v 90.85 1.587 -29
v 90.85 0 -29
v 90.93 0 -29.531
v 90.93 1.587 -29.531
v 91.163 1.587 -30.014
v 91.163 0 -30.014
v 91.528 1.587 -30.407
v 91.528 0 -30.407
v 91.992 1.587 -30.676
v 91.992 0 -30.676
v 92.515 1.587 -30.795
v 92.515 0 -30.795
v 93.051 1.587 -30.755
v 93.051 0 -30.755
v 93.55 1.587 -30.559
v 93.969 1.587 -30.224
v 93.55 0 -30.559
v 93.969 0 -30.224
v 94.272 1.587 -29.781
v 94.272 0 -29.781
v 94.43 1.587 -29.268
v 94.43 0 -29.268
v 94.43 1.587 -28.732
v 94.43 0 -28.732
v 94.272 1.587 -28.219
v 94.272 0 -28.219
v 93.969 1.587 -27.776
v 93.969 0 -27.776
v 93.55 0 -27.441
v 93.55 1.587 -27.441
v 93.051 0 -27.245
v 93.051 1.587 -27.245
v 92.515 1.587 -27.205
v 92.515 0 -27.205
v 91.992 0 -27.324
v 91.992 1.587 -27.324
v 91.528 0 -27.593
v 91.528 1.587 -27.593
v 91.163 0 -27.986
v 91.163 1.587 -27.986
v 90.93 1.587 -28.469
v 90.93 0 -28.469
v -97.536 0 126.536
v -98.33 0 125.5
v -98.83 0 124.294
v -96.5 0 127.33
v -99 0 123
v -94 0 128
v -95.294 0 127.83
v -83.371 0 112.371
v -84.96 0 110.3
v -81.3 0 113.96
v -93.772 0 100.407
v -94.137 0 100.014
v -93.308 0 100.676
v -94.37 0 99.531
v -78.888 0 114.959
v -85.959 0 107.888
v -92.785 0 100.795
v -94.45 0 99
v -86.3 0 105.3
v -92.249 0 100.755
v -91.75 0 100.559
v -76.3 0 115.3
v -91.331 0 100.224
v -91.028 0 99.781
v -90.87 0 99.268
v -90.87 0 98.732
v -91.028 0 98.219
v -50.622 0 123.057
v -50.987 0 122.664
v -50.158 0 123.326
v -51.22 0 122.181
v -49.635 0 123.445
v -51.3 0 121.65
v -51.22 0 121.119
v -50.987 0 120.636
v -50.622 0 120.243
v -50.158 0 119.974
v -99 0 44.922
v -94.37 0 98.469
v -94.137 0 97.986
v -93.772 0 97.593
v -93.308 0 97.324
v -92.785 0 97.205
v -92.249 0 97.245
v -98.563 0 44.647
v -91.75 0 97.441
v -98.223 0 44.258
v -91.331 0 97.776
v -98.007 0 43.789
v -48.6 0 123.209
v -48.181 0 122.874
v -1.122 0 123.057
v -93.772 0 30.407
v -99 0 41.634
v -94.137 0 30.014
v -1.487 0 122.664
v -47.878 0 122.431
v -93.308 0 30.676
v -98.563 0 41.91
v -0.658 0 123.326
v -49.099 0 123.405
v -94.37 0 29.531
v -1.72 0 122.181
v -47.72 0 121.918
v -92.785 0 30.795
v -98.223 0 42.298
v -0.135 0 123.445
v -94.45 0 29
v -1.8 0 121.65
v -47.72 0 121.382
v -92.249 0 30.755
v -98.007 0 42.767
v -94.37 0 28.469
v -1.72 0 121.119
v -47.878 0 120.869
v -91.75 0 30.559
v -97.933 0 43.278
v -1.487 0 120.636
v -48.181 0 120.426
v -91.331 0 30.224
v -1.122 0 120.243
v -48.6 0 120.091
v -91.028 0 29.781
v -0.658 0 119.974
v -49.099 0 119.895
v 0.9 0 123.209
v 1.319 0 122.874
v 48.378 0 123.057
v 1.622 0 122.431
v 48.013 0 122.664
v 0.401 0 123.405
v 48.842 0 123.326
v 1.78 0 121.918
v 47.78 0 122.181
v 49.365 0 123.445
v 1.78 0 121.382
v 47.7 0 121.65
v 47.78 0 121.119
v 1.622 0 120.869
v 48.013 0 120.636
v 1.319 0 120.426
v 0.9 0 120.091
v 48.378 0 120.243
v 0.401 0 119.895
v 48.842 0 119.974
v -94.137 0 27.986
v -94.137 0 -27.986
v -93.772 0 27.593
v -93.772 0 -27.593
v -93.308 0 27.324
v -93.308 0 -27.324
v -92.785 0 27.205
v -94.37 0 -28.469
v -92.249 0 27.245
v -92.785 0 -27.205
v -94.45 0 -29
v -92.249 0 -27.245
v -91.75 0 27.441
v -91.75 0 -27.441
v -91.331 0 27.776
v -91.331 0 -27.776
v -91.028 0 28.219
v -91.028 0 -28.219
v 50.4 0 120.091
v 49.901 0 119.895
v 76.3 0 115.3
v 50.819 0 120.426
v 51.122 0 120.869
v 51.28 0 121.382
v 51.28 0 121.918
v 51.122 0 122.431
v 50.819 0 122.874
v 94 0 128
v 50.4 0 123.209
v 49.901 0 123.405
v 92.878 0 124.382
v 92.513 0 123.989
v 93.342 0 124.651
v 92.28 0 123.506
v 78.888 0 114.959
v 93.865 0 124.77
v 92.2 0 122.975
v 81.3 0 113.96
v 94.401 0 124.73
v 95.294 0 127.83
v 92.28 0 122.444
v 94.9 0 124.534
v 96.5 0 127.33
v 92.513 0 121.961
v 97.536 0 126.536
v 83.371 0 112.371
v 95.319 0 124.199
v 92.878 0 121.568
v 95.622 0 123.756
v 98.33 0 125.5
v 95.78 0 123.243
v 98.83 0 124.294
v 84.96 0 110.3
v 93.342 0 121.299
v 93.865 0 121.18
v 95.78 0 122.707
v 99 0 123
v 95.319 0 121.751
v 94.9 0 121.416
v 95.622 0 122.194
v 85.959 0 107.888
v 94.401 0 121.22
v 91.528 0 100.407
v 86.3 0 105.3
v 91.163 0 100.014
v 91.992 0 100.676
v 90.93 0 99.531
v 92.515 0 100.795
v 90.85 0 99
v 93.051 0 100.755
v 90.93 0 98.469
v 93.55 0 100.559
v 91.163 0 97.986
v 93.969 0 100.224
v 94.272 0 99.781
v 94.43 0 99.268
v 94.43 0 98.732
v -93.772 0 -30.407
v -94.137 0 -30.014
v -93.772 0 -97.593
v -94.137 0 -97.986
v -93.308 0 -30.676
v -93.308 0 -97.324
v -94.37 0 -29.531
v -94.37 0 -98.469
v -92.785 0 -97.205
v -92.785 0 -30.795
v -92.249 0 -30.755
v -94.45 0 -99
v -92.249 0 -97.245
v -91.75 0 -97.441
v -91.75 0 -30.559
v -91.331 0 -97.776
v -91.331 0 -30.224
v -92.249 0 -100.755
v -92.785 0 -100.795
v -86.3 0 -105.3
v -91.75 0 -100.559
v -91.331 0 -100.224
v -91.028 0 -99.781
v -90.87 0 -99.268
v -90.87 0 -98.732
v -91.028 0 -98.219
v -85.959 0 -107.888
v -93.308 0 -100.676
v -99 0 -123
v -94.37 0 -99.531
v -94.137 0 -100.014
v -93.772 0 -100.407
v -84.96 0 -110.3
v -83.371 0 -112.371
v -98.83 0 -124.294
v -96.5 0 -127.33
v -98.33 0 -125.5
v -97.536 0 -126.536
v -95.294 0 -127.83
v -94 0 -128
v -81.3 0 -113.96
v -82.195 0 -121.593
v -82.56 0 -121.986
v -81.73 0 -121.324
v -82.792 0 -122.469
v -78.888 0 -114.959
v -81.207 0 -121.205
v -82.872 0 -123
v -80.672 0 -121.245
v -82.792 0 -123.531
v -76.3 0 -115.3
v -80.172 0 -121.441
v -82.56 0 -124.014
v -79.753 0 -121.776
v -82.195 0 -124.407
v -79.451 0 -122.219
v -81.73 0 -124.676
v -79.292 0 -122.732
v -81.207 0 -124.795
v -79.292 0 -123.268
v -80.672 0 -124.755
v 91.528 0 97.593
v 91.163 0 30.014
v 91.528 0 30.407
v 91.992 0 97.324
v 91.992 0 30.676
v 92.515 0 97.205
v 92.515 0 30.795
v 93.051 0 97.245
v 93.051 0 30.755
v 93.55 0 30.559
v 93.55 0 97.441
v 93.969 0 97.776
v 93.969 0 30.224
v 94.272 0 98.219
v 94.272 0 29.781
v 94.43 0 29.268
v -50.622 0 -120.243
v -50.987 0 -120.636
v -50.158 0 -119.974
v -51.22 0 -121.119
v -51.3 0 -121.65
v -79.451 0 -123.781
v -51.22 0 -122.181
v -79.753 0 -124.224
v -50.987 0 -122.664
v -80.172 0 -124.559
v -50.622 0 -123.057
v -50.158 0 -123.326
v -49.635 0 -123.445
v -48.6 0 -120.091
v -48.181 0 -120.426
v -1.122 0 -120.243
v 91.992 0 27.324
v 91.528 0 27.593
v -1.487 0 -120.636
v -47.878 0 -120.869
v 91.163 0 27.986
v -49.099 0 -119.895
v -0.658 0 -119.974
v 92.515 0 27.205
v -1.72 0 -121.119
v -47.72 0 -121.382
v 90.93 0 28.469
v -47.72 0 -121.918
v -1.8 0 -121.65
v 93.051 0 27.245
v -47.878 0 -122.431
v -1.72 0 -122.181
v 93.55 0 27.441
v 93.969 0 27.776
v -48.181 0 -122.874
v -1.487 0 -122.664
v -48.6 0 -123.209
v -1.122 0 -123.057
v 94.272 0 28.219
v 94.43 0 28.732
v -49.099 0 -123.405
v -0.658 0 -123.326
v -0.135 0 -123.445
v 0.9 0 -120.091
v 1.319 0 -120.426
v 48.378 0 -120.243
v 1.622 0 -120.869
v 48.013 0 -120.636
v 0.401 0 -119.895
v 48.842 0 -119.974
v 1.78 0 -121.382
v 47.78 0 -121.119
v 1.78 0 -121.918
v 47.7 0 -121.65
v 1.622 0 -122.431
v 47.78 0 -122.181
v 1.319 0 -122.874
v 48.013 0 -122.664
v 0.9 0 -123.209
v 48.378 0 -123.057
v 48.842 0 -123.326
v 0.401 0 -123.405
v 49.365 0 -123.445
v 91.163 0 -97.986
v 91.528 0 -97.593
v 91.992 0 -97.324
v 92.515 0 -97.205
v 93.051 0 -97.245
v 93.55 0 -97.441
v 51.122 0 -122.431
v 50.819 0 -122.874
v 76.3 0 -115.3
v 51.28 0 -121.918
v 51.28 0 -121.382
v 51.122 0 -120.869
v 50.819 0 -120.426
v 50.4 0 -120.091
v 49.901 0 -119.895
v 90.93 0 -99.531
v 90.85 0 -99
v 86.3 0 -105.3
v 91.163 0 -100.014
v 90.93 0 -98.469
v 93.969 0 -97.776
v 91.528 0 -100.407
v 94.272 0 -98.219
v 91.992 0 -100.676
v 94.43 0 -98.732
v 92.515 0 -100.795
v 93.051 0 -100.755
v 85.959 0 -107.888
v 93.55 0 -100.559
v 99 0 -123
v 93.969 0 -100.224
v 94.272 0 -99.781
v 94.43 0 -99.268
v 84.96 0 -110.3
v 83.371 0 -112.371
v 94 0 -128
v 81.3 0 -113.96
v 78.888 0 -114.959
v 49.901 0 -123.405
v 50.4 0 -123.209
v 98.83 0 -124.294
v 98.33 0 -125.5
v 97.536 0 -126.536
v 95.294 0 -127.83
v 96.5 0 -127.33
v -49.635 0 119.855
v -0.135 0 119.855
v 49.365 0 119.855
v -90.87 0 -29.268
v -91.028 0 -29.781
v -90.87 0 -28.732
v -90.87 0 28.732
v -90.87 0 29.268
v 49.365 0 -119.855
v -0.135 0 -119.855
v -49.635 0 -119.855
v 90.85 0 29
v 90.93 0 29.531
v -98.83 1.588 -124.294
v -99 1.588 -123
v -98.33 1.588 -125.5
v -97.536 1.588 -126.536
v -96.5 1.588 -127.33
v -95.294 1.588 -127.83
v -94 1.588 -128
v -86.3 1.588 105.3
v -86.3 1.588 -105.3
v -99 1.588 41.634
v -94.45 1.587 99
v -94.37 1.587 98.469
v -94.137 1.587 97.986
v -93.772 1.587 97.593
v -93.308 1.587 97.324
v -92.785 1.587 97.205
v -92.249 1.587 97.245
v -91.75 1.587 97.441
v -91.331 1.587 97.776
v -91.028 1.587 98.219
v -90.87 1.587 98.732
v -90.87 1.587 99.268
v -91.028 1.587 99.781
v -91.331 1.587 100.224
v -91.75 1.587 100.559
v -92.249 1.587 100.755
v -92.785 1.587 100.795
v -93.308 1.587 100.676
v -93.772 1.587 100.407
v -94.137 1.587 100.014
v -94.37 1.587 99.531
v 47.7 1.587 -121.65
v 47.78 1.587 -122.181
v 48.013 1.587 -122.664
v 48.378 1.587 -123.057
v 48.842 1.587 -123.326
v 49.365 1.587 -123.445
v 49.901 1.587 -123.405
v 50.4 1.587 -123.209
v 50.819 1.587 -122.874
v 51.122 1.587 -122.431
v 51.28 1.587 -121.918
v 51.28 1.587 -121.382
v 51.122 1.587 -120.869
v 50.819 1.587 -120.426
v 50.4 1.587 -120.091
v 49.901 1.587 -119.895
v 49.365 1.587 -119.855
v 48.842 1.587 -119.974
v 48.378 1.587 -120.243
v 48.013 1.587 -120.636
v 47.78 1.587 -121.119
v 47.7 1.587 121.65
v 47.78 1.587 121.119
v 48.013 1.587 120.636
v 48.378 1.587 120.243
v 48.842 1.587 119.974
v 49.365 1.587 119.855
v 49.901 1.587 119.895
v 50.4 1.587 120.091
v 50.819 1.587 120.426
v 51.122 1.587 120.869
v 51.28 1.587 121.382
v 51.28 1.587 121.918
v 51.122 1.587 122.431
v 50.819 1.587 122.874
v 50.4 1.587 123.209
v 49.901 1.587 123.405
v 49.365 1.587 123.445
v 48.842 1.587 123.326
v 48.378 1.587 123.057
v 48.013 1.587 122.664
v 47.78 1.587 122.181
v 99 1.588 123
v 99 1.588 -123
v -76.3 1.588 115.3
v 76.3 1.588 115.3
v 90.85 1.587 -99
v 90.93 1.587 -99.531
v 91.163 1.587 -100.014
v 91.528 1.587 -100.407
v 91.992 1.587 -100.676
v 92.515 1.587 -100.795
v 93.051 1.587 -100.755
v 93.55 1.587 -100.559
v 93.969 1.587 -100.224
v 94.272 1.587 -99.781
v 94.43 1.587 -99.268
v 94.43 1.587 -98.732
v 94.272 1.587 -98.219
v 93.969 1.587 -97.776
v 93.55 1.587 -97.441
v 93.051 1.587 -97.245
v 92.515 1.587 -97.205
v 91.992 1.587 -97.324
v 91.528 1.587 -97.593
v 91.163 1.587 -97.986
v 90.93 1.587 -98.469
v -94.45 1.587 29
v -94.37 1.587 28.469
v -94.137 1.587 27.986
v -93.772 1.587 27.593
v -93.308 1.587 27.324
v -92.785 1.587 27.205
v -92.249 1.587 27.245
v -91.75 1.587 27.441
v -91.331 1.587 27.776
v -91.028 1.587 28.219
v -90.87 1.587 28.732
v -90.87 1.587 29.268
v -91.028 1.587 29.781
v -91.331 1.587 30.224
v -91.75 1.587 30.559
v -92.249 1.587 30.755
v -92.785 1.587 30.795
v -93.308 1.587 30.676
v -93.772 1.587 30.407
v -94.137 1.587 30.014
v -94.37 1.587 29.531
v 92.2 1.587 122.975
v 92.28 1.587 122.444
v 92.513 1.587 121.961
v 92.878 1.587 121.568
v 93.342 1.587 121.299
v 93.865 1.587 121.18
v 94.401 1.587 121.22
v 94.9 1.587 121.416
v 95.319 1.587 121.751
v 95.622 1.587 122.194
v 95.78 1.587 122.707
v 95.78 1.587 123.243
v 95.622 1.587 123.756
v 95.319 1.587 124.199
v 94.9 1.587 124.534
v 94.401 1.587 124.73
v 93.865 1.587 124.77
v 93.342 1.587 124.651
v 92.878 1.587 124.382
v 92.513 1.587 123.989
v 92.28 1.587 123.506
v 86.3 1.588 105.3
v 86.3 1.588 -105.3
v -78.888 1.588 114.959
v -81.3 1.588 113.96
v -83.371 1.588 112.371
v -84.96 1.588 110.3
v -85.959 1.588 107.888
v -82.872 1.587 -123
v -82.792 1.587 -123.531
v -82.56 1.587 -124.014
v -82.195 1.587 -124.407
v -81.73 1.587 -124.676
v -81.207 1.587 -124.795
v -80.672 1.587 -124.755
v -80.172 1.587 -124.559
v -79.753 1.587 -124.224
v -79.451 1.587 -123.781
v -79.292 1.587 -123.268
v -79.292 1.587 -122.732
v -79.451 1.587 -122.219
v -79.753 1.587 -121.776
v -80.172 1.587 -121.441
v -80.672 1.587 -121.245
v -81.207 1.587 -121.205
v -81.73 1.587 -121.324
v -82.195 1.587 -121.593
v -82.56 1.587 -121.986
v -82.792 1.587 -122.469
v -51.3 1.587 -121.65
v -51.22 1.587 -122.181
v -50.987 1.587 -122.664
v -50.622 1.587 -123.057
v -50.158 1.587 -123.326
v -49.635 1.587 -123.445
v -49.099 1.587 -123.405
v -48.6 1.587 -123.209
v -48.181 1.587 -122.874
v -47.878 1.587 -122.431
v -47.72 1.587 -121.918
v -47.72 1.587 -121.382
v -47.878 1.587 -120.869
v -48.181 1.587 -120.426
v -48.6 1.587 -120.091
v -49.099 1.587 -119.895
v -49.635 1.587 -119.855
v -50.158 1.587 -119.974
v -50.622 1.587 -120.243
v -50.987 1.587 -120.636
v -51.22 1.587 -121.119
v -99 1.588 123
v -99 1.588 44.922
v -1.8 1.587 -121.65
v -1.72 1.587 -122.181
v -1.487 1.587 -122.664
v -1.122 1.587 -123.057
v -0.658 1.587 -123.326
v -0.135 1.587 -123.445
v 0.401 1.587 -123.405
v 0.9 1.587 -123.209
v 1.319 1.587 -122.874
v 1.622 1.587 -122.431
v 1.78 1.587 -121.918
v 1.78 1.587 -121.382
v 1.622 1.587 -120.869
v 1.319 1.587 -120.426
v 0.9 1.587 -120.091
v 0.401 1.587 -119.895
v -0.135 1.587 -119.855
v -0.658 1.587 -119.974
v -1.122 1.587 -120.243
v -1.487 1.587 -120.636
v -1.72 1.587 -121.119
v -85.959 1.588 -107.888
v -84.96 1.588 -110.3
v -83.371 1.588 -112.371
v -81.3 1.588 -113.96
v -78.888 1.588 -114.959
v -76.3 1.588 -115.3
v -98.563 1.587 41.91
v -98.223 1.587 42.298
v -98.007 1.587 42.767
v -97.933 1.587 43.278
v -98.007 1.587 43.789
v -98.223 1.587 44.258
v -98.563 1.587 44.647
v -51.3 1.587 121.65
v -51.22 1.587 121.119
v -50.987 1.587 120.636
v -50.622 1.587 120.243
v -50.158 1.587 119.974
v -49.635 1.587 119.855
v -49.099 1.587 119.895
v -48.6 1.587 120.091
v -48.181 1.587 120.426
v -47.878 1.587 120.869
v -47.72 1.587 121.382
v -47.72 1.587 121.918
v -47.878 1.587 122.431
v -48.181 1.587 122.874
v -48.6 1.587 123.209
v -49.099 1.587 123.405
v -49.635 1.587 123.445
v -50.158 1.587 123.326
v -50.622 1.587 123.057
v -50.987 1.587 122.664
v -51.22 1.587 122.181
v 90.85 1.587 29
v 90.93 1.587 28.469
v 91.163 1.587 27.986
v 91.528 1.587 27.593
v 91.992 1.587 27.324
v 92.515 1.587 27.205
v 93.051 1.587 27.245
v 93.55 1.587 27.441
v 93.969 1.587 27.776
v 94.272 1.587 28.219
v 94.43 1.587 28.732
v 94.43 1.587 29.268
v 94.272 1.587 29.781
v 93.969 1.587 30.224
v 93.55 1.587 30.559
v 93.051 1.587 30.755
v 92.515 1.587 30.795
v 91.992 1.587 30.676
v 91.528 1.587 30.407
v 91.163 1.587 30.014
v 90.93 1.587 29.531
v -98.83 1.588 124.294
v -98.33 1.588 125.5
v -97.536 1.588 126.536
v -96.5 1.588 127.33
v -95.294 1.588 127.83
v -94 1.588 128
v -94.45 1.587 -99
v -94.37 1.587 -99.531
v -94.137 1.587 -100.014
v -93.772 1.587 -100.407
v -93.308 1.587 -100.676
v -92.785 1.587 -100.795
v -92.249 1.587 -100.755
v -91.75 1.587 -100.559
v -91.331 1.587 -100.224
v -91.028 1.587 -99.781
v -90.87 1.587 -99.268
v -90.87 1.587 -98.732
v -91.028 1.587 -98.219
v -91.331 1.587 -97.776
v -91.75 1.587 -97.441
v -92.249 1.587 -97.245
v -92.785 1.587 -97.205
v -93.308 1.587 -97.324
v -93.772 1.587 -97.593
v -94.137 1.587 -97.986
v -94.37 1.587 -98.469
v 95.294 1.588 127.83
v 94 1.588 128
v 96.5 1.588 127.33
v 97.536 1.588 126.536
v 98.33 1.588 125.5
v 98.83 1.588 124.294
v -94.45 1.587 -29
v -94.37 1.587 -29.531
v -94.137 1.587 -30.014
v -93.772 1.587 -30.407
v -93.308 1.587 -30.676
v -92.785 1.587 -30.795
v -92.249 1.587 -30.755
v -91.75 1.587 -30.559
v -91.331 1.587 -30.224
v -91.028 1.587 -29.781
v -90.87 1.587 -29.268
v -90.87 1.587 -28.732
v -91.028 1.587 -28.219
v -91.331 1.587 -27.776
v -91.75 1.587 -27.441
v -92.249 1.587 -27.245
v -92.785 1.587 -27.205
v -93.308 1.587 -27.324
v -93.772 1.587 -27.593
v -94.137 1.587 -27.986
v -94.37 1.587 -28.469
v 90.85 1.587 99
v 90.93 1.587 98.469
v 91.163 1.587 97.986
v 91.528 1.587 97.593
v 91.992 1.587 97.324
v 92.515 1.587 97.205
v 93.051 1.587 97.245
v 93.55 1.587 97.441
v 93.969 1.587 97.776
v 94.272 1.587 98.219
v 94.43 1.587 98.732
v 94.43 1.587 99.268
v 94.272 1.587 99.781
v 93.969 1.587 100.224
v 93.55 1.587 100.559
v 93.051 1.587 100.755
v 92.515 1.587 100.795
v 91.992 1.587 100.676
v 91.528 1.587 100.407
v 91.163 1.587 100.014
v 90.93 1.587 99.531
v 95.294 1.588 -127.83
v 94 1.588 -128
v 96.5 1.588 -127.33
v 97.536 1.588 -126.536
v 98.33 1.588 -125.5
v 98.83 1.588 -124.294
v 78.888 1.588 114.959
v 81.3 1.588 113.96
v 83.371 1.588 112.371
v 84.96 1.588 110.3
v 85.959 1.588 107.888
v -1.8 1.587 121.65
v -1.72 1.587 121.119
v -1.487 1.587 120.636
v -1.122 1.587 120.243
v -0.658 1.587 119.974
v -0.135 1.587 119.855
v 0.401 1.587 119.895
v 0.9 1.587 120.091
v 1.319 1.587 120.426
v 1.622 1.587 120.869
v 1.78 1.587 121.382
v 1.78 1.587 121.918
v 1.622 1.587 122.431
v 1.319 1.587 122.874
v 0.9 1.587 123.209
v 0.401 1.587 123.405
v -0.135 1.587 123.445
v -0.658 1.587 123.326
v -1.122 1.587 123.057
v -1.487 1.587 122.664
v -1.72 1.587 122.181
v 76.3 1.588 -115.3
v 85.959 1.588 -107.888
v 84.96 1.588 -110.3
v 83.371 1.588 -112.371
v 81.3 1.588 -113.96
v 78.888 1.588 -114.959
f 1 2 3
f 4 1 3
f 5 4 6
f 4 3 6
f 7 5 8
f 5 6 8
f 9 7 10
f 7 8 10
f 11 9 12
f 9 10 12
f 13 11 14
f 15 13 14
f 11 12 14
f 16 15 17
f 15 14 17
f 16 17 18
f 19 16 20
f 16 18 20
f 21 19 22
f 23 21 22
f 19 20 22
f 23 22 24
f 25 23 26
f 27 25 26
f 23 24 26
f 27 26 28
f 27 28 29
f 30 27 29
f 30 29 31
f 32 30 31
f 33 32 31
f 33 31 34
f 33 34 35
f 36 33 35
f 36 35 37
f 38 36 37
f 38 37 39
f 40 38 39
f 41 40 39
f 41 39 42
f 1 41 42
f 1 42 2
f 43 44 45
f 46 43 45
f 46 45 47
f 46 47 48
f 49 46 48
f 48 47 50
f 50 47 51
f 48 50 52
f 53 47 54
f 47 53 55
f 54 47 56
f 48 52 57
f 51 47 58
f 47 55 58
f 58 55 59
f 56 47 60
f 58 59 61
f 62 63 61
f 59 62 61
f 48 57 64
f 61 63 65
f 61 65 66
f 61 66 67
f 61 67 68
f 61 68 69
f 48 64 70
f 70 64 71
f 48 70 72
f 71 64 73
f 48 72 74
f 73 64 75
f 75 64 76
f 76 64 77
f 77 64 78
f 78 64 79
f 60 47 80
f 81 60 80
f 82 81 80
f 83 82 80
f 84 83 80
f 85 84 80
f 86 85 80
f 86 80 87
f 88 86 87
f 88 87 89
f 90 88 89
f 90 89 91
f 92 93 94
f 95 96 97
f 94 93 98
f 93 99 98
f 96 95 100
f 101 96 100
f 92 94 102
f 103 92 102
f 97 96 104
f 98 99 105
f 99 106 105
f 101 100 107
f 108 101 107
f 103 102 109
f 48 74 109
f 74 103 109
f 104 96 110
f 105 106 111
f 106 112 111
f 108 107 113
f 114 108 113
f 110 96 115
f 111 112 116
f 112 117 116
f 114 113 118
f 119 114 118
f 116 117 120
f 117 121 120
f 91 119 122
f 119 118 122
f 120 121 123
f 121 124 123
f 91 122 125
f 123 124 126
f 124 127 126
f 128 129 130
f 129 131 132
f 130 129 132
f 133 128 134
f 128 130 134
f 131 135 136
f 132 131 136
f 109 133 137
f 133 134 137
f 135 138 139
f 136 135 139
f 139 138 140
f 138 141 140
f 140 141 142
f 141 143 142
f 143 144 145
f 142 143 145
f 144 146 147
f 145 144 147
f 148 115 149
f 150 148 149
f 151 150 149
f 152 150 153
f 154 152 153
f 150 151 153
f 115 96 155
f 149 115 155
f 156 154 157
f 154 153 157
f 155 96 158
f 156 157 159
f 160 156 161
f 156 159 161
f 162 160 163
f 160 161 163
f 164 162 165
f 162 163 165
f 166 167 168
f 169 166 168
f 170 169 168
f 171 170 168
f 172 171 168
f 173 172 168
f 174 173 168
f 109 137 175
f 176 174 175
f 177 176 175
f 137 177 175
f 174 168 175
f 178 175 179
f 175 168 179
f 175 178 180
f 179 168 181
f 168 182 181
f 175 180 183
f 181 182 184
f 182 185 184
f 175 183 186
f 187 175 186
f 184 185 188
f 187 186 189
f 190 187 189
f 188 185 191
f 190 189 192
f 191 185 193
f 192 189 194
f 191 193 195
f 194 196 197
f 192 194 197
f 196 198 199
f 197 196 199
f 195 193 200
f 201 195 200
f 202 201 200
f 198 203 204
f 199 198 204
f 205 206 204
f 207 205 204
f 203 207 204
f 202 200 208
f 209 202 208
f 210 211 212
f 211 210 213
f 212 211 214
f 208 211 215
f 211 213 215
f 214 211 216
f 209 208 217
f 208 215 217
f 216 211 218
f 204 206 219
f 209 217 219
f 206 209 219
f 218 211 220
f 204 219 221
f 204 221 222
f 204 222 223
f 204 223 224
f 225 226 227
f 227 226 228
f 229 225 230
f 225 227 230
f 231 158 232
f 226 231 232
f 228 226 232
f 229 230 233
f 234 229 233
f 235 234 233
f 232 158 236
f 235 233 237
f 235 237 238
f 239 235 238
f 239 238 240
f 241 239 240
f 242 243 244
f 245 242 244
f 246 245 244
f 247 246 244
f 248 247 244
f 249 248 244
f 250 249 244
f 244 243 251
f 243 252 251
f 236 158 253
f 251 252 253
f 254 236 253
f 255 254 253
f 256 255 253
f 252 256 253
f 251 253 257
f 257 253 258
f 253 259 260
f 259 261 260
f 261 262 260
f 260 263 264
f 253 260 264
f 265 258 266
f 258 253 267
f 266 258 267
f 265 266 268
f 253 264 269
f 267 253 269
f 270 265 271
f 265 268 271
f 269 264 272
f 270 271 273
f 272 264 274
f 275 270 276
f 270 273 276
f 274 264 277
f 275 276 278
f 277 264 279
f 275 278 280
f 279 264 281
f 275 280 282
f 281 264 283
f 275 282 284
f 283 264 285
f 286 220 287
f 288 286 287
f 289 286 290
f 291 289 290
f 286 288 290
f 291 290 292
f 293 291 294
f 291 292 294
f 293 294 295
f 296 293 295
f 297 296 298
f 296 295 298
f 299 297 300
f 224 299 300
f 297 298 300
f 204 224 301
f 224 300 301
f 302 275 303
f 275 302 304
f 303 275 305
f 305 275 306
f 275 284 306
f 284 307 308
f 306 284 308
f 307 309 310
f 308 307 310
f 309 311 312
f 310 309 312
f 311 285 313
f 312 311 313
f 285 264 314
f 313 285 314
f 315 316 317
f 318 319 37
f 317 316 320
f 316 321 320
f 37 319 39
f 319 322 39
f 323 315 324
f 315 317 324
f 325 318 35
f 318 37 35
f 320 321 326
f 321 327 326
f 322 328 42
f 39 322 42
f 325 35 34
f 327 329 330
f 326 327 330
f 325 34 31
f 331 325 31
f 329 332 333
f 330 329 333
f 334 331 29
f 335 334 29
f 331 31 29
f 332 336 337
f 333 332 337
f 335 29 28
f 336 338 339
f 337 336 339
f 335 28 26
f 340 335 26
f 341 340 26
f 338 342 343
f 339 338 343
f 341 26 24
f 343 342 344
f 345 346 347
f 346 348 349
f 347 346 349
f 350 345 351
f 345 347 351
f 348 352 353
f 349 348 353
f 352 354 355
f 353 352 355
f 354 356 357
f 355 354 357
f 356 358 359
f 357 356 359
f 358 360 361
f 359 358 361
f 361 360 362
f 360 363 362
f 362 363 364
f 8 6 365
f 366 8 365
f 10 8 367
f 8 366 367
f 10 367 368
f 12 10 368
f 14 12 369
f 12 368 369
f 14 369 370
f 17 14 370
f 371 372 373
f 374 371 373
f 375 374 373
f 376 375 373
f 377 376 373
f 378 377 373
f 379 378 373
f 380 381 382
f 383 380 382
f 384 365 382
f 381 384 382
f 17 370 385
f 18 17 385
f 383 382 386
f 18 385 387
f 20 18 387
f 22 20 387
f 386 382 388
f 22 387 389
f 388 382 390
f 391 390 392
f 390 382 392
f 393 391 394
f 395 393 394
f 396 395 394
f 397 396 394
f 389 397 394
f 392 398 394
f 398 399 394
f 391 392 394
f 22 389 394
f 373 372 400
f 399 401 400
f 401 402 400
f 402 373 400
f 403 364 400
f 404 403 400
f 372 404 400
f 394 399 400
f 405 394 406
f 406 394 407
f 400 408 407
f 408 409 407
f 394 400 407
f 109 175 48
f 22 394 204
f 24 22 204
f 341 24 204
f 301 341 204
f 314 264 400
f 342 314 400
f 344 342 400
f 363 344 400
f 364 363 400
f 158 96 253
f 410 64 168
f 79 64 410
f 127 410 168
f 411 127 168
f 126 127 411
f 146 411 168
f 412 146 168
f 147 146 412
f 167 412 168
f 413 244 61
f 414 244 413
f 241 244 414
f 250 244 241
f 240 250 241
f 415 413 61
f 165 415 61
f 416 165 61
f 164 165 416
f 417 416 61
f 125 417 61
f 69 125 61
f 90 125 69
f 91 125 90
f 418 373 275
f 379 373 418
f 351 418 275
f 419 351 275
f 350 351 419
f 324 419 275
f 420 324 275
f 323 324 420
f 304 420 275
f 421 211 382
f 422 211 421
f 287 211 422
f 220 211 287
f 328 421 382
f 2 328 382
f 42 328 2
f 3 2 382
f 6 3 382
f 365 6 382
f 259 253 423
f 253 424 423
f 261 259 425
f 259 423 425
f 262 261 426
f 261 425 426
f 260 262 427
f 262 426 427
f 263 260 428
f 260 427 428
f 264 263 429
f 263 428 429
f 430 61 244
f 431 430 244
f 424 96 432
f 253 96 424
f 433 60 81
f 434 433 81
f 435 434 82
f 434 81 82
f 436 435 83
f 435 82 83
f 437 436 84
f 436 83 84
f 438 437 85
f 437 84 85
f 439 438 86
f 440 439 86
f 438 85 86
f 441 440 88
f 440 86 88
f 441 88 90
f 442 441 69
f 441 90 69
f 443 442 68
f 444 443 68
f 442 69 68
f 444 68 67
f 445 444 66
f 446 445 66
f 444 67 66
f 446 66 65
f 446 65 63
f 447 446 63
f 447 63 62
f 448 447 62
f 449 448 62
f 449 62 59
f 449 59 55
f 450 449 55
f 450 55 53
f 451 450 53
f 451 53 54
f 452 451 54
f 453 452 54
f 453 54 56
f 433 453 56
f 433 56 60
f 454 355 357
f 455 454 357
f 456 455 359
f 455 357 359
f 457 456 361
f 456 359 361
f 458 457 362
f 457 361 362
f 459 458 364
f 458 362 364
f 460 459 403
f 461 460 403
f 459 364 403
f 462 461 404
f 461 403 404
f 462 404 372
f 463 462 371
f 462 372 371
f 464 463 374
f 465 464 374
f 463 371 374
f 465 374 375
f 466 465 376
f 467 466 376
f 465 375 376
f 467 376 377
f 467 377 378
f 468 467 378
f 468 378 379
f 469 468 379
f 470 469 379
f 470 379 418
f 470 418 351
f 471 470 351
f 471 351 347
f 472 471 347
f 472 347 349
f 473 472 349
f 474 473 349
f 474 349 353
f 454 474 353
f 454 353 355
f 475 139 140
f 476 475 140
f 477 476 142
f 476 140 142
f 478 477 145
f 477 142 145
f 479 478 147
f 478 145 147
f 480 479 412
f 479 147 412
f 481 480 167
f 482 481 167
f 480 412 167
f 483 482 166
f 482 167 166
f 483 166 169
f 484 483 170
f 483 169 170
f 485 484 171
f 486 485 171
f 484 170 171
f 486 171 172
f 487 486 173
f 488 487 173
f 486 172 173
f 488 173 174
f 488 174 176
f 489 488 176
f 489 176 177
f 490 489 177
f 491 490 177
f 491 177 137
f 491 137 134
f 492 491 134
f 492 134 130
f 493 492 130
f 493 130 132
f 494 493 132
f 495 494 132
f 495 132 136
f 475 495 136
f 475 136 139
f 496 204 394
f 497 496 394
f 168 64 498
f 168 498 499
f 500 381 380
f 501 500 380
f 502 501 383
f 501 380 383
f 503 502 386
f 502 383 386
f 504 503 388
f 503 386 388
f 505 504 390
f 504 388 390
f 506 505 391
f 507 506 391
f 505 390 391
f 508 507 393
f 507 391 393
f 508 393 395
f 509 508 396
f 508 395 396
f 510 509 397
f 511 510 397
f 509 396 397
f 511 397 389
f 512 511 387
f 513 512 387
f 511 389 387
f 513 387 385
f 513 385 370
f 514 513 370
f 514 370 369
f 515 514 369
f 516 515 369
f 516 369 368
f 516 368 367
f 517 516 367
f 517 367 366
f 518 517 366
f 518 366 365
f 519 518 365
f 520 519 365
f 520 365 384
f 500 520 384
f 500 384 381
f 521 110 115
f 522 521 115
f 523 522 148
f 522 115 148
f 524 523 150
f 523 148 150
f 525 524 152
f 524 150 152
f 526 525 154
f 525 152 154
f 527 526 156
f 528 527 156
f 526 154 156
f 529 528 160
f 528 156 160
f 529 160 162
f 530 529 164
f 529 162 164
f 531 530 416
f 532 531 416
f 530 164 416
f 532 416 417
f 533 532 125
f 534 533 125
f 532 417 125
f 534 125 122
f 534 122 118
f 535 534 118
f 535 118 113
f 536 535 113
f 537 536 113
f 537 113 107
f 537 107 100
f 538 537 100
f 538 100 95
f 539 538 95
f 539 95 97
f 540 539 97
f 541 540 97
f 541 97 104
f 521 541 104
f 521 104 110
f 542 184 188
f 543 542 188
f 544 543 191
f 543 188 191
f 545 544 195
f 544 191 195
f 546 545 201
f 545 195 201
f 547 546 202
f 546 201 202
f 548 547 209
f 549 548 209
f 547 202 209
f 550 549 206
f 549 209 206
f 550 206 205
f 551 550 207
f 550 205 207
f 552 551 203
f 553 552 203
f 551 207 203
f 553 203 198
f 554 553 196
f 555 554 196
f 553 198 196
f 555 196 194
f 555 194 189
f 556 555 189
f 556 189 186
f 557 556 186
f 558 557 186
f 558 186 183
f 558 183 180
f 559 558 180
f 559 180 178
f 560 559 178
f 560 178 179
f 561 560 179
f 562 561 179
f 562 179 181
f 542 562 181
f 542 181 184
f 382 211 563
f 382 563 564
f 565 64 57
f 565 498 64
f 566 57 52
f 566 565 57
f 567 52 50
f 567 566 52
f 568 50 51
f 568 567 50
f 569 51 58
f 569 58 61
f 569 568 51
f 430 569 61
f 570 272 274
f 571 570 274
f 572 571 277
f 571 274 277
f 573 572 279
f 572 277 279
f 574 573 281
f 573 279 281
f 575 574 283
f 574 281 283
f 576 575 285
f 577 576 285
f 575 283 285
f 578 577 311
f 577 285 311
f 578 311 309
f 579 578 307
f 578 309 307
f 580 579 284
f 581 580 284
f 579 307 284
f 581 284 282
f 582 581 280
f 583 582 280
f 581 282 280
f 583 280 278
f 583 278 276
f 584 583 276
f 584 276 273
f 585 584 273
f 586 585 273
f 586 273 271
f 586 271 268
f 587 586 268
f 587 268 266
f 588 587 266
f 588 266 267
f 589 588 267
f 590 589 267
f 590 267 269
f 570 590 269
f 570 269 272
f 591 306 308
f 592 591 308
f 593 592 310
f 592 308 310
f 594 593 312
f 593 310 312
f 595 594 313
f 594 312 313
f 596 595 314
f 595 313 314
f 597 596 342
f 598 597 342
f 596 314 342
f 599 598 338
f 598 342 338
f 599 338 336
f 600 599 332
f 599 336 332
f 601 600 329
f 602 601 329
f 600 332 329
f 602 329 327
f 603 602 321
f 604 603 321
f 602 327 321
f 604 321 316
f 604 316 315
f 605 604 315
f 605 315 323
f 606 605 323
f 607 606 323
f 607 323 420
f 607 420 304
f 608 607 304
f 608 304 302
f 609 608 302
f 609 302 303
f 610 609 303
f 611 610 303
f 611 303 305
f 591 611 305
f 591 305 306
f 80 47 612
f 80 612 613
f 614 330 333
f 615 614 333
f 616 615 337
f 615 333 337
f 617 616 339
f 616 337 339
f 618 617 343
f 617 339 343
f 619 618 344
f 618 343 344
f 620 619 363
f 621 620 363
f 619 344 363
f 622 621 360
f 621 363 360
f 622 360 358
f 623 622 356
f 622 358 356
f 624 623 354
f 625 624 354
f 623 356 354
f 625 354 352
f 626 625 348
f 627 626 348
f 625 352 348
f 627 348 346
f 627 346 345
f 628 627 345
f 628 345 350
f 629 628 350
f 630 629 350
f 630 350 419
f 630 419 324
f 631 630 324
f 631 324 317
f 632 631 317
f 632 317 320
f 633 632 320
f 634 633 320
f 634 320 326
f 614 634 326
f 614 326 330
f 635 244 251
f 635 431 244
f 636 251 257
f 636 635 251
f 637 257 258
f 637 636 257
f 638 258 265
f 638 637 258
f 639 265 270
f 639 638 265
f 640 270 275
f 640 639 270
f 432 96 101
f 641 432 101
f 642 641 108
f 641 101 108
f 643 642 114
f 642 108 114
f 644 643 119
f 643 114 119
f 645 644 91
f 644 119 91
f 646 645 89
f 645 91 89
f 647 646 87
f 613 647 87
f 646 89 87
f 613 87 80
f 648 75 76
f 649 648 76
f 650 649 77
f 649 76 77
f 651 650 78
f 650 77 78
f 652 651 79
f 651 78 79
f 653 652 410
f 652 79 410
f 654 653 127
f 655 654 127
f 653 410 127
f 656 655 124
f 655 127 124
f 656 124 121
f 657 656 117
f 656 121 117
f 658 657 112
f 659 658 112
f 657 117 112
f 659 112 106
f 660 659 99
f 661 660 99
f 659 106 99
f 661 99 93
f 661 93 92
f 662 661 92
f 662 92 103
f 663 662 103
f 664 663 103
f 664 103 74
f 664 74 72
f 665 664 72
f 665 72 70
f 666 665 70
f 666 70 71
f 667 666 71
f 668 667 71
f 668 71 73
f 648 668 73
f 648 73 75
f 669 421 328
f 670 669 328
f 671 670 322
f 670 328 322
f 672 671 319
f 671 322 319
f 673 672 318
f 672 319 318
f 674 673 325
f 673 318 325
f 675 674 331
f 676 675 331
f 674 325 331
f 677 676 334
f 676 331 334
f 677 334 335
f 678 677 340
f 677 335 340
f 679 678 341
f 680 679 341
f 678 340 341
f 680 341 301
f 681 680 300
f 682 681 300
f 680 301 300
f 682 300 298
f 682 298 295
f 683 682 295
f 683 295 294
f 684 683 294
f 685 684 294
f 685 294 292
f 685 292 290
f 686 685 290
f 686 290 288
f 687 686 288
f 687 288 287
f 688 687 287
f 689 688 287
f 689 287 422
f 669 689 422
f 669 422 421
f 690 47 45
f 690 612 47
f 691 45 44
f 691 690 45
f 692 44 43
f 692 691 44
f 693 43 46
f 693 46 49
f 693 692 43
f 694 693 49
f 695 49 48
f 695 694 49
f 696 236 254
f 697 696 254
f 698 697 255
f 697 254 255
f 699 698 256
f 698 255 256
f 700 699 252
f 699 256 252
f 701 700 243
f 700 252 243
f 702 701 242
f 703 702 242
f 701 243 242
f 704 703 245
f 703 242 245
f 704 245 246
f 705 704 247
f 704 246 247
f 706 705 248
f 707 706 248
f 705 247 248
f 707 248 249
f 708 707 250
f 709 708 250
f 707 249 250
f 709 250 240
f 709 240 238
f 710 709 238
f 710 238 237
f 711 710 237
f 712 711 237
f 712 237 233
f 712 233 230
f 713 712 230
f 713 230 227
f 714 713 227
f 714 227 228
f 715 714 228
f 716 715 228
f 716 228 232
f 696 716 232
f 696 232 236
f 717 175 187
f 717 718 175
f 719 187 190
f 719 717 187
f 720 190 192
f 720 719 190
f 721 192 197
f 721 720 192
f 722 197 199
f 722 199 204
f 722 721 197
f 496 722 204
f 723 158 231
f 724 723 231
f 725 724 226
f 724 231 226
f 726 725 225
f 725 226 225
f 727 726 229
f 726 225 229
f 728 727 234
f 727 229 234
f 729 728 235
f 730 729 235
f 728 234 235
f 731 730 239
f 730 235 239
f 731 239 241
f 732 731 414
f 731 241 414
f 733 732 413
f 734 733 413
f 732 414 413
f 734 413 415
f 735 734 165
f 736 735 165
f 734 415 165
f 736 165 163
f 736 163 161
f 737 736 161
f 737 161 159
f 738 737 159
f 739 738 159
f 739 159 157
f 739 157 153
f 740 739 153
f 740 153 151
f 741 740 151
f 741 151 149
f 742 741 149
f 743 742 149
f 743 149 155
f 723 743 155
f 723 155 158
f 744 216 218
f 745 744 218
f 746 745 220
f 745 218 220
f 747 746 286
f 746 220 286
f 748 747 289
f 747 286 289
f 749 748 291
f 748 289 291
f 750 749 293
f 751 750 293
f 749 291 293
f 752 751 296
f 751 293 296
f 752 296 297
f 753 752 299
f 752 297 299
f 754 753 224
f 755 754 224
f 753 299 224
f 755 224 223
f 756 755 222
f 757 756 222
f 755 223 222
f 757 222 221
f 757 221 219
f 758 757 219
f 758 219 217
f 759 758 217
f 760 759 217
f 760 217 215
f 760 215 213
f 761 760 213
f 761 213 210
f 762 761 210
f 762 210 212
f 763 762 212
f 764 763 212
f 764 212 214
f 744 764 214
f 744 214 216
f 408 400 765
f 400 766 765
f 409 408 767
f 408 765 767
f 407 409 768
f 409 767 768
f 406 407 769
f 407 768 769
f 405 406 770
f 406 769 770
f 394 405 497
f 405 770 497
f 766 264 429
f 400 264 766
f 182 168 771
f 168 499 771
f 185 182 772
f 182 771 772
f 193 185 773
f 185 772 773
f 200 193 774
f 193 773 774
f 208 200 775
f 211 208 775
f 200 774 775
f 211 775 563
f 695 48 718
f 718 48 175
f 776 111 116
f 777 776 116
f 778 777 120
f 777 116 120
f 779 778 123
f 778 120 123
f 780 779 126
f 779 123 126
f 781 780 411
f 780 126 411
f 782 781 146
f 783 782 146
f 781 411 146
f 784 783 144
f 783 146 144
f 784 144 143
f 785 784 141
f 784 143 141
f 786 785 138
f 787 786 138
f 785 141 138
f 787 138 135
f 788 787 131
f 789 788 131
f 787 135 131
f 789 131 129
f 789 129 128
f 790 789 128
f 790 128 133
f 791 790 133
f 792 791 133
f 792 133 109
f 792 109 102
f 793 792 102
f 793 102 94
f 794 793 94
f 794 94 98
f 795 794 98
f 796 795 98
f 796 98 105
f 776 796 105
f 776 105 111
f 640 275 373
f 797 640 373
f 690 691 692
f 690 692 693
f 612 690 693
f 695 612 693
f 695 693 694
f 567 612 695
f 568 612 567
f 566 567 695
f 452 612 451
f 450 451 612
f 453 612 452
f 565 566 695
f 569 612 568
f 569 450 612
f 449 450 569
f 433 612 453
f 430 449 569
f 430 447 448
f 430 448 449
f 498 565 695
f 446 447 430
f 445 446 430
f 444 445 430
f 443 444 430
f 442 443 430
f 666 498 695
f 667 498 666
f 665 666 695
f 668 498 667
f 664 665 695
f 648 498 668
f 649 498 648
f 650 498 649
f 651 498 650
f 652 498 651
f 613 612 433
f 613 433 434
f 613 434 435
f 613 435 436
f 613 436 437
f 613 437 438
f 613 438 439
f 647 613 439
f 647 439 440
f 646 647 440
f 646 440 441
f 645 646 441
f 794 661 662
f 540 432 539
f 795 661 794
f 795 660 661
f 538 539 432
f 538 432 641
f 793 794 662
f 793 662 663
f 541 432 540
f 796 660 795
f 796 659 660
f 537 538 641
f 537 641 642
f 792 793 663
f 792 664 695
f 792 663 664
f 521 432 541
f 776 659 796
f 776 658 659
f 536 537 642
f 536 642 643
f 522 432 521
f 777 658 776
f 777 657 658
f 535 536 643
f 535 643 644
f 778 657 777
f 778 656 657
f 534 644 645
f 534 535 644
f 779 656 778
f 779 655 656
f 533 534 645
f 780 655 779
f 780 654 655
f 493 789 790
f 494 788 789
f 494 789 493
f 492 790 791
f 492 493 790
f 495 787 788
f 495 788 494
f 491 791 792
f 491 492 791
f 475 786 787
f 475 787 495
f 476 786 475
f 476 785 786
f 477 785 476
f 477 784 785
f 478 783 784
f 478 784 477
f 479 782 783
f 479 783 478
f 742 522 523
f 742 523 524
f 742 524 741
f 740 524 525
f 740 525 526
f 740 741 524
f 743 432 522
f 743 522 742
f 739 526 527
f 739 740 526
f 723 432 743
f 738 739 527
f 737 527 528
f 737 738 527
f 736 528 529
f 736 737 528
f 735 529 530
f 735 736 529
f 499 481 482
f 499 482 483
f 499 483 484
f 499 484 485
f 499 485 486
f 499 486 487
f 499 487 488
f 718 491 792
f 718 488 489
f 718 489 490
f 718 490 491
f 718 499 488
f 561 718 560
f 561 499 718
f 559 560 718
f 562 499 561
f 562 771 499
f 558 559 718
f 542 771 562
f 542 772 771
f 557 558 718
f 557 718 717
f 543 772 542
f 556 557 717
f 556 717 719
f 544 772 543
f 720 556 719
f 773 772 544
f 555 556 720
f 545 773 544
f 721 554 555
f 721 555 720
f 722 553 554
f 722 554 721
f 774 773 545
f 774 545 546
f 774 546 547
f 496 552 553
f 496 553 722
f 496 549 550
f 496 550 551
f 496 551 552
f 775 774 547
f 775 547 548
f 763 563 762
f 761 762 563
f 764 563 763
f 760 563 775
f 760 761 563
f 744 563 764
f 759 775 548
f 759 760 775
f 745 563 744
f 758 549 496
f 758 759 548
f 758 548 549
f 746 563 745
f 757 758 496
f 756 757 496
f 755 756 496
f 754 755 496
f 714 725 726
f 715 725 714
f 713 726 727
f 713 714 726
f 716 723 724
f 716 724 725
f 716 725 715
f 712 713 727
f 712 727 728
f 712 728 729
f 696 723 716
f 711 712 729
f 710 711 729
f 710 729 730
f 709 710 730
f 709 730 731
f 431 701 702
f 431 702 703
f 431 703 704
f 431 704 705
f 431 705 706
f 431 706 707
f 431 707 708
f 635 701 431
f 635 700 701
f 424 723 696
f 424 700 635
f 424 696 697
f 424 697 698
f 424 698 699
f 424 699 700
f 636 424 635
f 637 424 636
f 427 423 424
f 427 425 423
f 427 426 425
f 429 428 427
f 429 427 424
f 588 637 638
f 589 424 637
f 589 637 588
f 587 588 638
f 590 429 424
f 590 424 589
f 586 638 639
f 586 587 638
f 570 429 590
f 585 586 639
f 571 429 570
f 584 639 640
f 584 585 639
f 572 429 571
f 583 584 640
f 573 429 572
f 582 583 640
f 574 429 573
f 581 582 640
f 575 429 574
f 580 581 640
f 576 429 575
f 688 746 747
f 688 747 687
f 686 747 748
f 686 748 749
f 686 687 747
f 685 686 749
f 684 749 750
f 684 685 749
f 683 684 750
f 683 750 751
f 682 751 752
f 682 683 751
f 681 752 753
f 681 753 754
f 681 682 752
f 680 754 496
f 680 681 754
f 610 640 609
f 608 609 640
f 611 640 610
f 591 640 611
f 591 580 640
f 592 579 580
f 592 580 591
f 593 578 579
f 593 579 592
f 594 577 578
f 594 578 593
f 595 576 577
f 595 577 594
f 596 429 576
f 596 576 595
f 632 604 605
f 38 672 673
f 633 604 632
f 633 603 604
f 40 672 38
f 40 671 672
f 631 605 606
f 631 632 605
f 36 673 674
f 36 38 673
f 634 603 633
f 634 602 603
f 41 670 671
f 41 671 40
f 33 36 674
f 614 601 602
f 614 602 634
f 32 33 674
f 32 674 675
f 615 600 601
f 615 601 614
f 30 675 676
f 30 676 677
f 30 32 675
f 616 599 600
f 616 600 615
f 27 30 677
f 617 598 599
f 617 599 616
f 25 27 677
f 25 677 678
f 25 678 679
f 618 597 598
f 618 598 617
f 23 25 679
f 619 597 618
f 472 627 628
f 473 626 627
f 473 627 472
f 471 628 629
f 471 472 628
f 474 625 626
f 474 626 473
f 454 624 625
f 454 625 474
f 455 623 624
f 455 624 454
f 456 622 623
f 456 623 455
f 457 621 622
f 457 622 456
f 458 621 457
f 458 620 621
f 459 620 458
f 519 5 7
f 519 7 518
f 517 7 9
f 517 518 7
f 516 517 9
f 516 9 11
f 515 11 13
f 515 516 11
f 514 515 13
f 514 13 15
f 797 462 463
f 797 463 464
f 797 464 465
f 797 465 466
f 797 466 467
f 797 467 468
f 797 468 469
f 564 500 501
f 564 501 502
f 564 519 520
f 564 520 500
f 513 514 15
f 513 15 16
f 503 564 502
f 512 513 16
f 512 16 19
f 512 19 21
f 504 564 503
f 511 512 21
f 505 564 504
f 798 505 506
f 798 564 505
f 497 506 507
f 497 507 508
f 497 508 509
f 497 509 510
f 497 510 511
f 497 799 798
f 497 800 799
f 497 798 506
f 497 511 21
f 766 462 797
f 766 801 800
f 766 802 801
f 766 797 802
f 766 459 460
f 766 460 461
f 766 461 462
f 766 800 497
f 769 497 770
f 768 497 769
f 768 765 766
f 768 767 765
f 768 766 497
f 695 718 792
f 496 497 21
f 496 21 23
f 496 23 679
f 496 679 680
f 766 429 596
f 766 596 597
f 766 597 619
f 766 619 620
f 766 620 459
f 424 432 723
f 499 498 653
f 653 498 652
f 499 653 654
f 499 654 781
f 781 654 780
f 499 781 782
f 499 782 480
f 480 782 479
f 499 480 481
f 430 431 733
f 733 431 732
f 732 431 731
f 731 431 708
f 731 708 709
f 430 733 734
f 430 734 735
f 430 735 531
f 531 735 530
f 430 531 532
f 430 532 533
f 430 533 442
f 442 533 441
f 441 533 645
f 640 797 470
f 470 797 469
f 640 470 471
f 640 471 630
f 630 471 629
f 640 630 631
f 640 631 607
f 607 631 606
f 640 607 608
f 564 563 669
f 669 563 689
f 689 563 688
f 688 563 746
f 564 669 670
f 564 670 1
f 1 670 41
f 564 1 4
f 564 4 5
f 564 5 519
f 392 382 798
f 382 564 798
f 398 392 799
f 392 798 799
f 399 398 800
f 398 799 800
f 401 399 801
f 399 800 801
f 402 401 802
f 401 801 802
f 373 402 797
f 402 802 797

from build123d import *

# Parameters (mm, degrees)
SKETCH1_W            = 198
SKETCH1_H            = 256
SKETCH1_W_2          = 172.6
SKETCH1_H_2          = 230.6
MAINBODY_DEPTH       = 1.5875
M3_CLEARANCE_HOLE1_D = 3.6
INSIDEFILLET_R       = 10
FILLET2_R            = 5
M3_CLEARANCE_HOLE2_D = 3.6


with BuildPart() as part:
    # Sketch1 → MainBody (new body)
    with BuildSketch(Plane(origin=(0, 0, 0), x_dir=(1, 0, 0), z_dir=(0, 1, 0))):
        Rectangle(SKETCH1_W, SKETCH1_H)
        Rectangle(SKETCH1_W_2, SKETCH1_H_2, mode=Mode.SUBTRACT)
    extrude(amount=MAINBODY_DEPTH)

    # M3 Clearance Hole1 (through all)
    with Locations(Plane(origin=(0, 1.5875, 0), x_dir=(1, 0, 0), z_dir=(0, 1, 0))):
        with Locations((-92.65, 99), (-92.65, 29), (-92.65, -29), (-92.65, -99), (92.65, -99), (92.65, -29), (92.65, 29), (92.65, 99), (0, 121.65), (-49.5, 121.65), (49.5, -121.65), (0, -121.65), (-49.5, -121.65), (49.5, 121.65)):
            Hole(M3_CLEARANCE_HOLE1_D / 2)

    # InsideFillet
    insidefillet_edges = [part.edges().sort_by_distance(p)[0] for p in [
        (86.3, 0.79375, 115.3),
        (86.3, 0.79375, -115.3),
        (-86.3, 0.79375, -115.3),
        (-86.3, 0.79375, 115.3),
    ]]
    fillet(insidefillet_edges, radius=INSIDEFILLET_R)

    # Fillet2
    fillet2_edges = [part.edges().sort_by_distance(p)[0] for p in [
        (99, 0.79375, 128),
        (-99, 0.79375, 128),
        (-99, 0.79375, -128),
        (99, 0.79375, -128),
    ]]
    fillet(fillet2_edges, radius=FILLET2_R)

    # M3 Clearance Hole2 (through all)
    with Locations(Plane(origin=(0, 1.5875, 0), x_dir=(1, 0, 0), z_dir=(0, 1, 0))):
        with Locations((-81.072343025, 123), (106.927656975, 123), (94, -122.975), (-99.732934362, -43.278306391)):
            Hole(M3_CLEARANCE_HOLE2_D / 2)


solid = part.part
